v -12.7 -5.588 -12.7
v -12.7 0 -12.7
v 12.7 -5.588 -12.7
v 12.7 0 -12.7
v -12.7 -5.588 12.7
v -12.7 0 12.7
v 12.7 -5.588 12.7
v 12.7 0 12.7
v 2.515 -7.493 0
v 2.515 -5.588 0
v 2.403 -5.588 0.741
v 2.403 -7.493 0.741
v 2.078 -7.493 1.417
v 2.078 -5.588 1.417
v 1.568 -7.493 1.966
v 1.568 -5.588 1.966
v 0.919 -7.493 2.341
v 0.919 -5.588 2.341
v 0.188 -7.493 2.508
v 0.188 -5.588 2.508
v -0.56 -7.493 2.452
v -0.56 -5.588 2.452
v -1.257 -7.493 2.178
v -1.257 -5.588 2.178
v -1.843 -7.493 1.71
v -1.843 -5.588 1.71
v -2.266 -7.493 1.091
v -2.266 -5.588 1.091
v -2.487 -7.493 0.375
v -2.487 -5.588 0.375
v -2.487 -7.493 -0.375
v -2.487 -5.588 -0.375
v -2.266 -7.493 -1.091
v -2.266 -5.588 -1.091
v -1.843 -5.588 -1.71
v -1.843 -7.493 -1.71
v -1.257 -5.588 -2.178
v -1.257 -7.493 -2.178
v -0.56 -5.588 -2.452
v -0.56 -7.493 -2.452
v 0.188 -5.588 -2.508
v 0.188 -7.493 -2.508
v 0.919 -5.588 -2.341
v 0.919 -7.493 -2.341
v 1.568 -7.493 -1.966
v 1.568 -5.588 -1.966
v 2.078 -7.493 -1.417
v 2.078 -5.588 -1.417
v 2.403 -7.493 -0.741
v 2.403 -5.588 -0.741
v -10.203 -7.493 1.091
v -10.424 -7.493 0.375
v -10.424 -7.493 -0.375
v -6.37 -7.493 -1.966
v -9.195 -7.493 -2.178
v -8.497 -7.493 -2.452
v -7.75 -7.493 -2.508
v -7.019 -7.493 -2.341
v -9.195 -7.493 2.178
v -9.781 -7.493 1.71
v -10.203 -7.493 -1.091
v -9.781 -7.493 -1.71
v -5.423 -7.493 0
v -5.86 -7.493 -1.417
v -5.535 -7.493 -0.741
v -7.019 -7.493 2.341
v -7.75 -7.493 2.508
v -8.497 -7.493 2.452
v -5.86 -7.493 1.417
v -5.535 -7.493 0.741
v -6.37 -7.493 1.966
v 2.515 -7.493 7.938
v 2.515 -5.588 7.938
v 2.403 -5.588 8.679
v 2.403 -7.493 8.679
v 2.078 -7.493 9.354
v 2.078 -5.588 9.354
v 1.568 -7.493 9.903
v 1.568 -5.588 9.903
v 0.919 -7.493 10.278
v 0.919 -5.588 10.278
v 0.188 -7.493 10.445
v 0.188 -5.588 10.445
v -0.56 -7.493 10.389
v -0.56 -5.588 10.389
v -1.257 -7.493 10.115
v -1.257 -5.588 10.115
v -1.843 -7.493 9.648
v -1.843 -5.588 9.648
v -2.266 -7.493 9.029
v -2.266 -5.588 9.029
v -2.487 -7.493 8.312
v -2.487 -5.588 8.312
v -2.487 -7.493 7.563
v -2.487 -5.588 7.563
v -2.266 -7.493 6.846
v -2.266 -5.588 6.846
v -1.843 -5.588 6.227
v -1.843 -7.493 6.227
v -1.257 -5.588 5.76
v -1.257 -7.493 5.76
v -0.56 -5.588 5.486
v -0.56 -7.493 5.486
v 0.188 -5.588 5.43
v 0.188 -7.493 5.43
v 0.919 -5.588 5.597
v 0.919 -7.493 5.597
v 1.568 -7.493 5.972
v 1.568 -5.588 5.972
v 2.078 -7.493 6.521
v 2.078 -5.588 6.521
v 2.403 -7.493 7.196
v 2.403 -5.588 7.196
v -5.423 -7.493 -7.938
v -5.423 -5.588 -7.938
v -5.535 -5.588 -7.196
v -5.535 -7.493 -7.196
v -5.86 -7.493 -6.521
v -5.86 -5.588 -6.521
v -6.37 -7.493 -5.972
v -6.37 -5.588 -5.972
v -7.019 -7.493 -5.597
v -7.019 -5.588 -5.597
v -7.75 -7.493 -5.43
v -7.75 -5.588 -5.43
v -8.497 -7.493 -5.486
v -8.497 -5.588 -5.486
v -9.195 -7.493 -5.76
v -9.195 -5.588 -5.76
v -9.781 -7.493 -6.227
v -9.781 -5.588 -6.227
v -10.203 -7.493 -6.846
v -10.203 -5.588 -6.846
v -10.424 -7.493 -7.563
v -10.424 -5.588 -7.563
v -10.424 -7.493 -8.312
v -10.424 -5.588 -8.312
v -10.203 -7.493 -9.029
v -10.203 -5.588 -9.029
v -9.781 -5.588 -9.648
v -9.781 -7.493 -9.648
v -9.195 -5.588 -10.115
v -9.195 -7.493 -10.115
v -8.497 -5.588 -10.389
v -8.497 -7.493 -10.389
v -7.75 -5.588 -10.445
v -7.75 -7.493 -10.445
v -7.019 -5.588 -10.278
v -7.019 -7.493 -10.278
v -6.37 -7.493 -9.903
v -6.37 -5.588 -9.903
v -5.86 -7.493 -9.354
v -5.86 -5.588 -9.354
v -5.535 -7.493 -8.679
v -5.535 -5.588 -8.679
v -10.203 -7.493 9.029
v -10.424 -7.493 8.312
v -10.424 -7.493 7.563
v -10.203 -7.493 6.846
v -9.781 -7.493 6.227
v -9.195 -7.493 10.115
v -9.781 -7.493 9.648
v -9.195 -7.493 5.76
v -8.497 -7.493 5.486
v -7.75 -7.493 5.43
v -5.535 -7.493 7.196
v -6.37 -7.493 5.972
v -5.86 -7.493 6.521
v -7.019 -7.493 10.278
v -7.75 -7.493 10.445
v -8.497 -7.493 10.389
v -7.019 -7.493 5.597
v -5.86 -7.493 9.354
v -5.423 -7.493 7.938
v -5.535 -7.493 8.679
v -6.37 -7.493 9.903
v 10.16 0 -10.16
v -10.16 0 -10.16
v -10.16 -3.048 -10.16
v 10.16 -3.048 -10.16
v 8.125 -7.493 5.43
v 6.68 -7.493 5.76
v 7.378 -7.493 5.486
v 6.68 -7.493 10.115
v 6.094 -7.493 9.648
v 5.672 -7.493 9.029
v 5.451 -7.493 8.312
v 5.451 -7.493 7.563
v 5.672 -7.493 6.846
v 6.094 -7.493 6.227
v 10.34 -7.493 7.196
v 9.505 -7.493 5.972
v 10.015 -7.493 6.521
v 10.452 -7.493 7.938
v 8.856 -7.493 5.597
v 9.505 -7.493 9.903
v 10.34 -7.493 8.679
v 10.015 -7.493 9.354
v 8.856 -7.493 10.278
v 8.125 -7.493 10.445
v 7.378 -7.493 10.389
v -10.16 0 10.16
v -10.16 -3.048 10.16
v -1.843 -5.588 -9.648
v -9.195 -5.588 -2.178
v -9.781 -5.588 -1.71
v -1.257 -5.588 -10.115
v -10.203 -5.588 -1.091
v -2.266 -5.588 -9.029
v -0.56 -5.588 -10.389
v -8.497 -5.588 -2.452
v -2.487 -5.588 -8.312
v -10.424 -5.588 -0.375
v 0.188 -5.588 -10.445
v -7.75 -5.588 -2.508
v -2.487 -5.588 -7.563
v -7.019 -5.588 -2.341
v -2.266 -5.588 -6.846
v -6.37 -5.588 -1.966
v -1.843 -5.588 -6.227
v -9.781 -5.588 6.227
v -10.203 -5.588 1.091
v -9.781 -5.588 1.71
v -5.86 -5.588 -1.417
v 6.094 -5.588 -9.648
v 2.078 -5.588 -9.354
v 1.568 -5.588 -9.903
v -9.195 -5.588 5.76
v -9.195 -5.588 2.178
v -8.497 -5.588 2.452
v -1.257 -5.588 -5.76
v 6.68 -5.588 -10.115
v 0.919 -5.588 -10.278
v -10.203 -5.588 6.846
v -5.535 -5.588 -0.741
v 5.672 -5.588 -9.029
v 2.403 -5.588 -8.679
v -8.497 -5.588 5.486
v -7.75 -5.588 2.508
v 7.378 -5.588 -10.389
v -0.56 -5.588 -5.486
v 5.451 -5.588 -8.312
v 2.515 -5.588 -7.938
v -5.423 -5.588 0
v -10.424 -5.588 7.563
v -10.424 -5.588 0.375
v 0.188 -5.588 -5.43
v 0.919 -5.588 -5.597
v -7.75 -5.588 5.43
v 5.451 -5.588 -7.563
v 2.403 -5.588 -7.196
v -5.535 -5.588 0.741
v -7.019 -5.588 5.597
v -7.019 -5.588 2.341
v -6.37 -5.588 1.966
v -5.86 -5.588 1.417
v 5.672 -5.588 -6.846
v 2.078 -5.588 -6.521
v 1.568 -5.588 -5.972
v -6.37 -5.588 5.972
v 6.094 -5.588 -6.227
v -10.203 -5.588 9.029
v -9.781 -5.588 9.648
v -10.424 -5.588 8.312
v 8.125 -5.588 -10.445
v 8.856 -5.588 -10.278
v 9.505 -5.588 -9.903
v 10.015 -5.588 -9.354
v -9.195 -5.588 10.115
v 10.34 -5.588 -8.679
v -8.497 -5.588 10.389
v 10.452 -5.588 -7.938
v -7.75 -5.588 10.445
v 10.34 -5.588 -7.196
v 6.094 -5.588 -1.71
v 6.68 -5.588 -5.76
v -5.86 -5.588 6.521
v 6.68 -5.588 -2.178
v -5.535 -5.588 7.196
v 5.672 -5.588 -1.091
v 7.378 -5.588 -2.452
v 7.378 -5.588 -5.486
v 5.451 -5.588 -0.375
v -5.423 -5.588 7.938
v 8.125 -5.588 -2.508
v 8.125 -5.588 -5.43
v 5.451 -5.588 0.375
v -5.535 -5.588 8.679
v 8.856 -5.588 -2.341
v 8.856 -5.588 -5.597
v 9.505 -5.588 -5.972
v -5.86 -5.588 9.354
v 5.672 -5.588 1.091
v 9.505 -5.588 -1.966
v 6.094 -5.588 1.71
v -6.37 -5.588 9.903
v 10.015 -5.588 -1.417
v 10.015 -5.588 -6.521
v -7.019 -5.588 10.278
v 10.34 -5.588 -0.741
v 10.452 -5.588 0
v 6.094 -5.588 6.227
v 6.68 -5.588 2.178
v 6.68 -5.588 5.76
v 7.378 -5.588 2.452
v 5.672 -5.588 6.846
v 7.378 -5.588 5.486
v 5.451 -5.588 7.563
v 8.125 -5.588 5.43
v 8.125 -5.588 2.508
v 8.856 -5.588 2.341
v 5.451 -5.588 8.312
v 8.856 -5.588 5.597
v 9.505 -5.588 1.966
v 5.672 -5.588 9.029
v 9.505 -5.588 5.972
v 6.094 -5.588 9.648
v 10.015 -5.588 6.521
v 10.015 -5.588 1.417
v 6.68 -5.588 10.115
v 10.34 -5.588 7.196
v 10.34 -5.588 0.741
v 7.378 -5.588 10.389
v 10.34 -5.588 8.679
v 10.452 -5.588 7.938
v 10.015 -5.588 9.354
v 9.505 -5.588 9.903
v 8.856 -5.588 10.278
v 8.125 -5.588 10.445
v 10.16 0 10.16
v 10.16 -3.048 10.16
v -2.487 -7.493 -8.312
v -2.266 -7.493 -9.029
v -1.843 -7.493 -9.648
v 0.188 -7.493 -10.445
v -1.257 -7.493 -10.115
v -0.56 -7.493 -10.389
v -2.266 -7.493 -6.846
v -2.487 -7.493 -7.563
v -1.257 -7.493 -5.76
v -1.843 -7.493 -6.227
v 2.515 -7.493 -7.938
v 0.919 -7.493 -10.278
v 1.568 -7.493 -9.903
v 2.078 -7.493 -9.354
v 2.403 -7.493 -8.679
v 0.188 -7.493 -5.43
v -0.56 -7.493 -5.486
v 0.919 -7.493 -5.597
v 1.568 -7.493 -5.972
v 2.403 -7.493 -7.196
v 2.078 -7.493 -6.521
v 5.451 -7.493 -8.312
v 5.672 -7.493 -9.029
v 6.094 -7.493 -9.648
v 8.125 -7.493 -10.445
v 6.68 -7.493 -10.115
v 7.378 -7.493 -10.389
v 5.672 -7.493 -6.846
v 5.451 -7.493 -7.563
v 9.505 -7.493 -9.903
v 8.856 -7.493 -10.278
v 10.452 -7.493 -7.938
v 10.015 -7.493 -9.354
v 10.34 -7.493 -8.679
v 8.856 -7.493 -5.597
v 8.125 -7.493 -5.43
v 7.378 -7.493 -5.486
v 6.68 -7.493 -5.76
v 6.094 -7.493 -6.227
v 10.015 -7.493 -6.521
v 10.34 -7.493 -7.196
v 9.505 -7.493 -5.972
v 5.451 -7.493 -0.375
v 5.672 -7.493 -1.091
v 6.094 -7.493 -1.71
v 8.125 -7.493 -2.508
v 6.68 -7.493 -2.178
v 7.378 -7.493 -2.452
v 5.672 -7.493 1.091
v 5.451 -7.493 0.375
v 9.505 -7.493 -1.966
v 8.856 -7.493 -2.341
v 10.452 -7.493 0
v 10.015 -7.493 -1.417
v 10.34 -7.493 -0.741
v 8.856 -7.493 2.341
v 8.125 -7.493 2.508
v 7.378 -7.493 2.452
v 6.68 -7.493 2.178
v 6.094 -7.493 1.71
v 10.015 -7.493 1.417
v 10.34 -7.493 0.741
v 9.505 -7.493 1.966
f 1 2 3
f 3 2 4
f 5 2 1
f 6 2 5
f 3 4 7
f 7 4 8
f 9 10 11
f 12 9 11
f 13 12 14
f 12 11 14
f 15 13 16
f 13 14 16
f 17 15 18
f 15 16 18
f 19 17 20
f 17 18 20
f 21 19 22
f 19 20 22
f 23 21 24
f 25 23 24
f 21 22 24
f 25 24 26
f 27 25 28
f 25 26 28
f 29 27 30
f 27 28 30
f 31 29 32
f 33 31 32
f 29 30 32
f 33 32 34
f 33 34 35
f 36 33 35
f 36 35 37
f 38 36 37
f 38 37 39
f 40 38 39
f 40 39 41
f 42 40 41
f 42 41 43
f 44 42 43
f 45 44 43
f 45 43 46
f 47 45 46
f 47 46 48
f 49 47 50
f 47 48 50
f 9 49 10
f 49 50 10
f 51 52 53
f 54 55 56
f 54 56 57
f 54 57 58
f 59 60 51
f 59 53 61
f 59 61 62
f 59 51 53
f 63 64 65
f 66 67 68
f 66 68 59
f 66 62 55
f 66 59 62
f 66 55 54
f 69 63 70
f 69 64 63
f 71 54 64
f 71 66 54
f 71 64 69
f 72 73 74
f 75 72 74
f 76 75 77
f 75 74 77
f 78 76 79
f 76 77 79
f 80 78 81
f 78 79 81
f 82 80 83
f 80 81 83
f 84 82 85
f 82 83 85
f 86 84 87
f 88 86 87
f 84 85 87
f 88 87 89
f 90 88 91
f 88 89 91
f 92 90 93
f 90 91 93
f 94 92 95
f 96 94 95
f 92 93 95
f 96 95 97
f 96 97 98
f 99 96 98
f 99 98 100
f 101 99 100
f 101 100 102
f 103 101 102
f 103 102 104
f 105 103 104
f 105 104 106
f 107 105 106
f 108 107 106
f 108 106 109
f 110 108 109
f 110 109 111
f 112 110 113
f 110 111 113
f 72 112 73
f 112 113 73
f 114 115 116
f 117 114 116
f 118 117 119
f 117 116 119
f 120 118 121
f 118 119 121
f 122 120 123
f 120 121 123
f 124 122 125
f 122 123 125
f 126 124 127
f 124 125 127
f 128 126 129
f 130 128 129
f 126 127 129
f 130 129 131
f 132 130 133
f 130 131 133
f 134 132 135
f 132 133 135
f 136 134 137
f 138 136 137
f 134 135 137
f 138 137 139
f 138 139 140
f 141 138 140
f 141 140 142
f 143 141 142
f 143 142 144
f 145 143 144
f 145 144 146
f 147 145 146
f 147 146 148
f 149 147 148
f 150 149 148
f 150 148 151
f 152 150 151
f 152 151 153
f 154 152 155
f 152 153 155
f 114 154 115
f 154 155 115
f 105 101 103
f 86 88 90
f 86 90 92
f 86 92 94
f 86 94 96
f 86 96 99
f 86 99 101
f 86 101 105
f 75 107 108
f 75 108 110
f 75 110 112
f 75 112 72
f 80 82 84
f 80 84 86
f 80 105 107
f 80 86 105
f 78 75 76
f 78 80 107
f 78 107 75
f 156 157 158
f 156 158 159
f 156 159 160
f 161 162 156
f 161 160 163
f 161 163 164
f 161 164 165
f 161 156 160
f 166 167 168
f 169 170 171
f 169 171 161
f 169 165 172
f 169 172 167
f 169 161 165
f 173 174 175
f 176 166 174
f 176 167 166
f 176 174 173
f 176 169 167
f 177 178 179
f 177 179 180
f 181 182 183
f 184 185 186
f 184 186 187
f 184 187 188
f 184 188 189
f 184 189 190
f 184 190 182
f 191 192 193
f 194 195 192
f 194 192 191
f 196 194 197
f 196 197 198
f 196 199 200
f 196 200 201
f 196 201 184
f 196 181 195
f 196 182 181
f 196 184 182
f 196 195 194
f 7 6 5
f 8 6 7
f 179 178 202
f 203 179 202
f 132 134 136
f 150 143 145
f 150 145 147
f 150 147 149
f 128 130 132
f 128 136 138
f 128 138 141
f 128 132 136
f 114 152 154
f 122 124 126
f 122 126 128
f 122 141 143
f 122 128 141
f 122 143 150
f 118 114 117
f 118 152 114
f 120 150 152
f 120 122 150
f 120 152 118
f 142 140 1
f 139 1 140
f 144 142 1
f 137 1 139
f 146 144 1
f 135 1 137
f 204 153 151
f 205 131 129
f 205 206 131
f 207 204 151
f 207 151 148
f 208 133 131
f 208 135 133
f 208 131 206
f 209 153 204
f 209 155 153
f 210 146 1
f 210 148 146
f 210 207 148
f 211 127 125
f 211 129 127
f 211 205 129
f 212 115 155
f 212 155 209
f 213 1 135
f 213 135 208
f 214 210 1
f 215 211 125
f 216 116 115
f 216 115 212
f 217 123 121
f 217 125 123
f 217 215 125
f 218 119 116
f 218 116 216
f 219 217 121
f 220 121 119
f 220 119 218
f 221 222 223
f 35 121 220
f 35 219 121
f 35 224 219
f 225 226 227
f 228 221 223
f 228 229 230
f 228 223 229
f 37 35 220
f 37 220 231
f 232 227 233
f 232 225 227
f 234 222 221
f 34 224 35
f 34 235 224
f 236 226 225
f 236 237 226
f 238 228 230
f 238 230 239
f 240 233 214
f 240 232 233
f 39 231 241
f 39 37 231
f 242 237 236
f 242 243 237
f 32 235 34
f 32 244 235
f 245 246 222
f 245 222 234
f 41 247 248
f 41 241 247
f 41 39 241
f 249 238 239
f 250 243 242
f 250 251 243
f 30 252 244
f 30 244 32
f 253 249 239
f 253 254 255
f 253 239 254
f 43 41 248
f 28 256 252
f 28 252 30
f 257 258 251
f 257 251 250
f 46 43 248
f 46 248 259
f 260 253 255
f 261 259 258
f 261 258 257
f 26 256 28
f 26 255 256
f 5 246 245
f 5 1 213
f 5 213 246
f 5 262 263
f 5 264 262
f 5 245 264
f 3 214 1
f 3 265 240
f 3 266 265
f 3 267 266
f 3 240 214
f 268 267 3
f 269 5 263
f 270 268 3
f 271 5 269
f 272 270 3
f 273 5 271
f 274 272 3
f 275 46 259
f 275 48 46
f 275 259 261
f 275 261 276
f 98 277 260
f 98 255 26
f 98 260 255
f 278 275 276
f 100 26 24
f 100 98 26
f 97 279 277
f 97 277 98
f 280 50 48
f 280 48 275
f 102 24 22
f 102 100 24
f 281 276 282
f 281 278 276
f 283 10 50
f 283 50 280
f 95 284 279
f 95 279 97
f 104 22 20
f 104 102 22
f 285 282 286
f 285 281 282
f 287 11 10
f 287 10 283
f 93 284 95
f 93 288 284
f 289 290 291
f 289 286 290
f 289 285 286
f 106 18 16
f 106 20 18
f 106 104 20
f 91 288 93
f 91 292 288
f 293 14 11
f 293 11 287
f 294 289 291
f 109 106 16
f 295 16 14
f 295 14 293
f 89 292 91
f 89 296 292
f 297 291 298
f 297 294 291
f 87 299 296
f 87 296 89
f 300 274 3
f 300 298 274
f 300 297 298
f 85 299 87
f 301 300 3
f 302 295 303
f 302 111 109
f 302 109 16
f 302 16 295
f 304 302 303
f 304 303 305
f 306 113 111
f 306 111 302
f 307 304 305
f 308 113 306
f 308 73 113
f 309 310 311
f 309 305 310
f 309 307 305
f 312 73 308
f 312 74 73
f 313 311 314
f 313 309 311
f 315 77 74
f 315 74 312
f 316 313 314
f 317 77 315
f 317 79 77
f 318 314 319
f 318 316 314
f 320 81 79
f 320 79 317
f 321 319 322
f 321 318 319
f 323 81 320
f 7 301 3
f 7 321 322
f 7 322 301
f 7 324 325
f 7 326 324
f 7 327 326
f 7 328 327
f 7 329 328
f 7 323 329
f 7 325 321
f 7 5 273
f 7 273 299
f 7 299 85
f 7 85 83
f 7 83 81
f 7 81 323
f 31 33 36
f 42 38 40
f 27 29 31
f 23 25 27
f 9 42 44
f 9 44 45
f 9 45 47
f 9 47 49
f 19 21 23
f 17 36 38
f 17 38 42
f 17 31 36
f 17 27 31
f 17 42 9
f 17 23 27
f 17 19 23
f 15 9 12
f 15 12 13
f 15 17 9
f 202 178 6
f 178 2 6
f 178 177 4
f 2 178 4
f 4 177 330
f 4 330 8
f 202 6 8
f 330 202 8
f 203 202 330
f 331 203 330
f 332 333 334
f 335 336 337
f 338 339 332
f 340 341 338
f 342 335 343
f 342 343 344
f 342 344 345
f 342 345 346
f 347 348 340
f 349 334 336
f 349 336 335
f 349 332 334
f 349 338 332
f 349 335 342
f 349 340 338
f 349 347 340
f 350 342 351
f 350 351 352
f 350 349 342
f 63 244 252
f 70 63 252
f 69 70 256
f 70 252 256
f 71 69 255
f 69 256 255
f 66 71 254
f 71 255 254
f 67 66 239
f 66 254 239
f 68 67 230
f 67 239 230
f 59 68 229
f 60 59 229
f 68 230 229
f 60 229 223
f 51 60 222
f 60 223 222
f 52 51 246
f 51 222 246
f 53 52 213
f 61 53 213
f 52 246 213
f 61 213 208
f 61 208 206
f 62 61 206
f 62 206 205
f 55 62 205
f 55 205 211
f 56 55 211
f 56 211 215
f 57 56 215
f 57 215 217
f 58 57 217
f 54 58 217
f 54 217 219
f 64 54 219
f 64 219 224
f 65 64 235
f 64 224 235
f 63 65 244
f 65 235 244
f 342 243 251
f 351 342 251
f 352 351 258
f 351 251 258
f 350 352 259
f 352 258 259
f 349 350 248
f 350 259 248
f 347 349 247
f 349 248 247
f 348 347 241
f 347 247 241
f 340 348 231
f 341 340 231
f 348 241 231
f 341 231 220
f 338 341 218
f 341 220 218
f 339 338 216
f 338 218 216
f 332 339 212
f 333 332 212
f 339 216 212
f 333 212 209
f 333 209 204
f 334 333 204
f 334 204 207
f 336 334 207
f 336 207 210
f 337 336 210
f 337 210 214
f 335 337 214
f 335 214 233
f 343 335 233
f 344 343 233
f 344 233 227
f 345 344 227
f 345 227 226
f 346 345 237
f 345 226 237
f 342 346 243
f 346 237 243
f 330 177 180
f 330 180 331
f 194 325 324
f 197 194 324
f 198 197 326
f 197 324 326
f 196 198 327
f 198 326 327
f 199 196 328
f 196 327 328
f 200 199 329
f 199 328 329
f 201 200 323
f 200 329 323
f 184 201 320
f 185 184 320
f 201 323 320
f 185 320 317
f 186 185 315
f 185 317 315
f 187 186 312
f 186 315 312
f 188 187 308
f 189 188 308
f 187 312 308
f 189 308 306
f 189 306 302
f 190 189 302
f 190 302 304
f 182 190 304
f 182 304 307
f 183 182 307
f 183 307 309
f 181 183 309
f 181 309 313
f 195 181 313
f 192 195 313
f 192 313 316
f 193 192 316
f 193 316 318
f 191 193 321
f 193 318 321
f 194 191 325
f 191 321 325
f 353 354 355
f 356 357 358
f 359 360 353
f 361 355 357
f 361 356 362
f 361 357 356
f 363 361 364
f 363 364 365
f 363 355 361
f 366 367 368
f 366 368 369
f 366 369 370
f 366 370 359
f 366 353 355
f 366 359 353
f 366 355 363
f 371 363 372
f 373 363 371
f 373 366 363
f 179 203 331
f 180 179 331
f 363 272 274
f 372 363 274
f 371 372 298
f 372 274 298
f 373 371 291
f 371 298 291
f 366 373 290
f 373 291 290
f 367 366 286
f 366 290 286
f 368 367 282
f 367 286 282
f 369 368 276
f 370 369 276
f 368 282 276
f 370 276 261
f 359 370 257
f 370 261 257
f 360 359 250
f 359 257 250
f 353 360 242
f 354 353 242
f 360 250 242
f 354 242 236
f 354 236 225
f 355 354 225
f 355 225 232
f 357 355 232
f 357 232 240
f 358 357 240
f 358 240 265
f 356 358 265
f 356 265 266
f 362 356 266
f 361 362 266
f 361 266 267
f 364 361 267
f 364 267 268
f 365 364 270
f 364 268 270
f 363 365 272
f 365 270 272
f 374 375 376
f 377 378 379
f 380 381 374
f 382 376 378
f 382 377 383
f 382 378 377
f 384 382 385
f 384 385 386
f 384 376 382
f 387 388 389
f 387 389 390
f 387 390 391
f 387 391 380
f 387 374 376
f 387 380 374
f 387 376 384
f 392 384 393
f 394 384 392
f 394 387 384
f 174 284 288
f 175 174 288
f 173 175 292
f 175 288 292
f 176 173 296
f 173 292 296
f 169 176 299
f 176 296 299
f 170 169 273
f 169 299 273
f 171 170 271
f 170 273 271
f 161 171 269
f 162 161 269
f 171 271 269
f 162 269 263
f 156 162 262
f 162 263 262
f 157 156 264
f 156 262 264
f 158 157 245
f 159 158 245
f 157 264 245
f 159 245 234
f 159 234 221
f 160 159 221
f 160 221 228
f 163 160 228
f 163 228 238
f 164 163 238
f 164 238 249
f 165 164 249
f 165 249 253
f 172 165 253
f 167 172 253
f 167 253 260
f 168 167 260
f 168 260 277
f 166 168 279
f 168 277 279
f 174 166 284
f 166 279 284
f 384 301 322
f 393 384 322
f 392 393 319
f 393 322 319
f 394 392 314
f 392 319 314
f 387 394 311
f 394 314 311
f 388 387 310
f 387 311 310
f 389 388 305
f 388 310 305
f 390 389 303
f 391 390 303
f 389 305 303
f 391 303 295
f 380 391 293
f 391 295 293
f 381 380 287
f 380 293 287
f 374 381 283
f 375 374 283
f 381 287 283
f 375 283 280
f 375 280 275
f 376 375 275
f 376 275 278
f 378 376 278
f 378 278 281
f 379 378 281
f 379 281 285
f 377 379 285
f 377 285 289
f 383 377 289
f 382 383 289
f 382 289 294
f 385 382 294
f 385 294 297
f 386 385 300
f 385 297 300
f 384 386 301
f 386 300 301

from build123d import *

# Parameters (mm, degrees)
F0_W     = 25.4
F0_H     = 25.4
F1_DEPTH = 5.588
F3_T     = -2.54
F2_R     = 2.5146
F4_DEPTH = 1.905


with BuildPart() as f1:
    # F0 (on Front) → F1 (new body)
    with BuildSketch(Plane.XZ):
        Rectangle(F0_W, F0_H)
    extrude(amount=F1_DEPTH)

    # F3
    f3_openings = [f1.faces().sort_by_distance(p)[0] for p in [
        (0, 0, 0),
    ]]
    offset(amount=F3_T, openings=f3_openings)

    # F2 (on face) → F4 (join)
    with BuildSketch(Plane.XZ.offset(5.588)):
        with Locations((-7.9375, 7.9375)):
            Circle(F2_R)
        with Locations((0, 7.9375)):
            Circle(F2_R)
        with Locations((7.9375, 7.9375)):
            Circle(F2_R)
        with Locations((7.9375, 0)):
            Circle(F2_R)
        Circle(F2_R)
        with Locations((-7.9375, 0)):
            Circle(F2_R)
        with Locations((-7.9375, -7.9375)):
            Circle(F2_R)
        with Locations((0, -7.9375)):
            Circle(F2_R)
        with Locations((7.9375, -7.9375)):
            Circle(F2_R)
    extrude(amount=F4_DEPTH)


solid = f1.part
